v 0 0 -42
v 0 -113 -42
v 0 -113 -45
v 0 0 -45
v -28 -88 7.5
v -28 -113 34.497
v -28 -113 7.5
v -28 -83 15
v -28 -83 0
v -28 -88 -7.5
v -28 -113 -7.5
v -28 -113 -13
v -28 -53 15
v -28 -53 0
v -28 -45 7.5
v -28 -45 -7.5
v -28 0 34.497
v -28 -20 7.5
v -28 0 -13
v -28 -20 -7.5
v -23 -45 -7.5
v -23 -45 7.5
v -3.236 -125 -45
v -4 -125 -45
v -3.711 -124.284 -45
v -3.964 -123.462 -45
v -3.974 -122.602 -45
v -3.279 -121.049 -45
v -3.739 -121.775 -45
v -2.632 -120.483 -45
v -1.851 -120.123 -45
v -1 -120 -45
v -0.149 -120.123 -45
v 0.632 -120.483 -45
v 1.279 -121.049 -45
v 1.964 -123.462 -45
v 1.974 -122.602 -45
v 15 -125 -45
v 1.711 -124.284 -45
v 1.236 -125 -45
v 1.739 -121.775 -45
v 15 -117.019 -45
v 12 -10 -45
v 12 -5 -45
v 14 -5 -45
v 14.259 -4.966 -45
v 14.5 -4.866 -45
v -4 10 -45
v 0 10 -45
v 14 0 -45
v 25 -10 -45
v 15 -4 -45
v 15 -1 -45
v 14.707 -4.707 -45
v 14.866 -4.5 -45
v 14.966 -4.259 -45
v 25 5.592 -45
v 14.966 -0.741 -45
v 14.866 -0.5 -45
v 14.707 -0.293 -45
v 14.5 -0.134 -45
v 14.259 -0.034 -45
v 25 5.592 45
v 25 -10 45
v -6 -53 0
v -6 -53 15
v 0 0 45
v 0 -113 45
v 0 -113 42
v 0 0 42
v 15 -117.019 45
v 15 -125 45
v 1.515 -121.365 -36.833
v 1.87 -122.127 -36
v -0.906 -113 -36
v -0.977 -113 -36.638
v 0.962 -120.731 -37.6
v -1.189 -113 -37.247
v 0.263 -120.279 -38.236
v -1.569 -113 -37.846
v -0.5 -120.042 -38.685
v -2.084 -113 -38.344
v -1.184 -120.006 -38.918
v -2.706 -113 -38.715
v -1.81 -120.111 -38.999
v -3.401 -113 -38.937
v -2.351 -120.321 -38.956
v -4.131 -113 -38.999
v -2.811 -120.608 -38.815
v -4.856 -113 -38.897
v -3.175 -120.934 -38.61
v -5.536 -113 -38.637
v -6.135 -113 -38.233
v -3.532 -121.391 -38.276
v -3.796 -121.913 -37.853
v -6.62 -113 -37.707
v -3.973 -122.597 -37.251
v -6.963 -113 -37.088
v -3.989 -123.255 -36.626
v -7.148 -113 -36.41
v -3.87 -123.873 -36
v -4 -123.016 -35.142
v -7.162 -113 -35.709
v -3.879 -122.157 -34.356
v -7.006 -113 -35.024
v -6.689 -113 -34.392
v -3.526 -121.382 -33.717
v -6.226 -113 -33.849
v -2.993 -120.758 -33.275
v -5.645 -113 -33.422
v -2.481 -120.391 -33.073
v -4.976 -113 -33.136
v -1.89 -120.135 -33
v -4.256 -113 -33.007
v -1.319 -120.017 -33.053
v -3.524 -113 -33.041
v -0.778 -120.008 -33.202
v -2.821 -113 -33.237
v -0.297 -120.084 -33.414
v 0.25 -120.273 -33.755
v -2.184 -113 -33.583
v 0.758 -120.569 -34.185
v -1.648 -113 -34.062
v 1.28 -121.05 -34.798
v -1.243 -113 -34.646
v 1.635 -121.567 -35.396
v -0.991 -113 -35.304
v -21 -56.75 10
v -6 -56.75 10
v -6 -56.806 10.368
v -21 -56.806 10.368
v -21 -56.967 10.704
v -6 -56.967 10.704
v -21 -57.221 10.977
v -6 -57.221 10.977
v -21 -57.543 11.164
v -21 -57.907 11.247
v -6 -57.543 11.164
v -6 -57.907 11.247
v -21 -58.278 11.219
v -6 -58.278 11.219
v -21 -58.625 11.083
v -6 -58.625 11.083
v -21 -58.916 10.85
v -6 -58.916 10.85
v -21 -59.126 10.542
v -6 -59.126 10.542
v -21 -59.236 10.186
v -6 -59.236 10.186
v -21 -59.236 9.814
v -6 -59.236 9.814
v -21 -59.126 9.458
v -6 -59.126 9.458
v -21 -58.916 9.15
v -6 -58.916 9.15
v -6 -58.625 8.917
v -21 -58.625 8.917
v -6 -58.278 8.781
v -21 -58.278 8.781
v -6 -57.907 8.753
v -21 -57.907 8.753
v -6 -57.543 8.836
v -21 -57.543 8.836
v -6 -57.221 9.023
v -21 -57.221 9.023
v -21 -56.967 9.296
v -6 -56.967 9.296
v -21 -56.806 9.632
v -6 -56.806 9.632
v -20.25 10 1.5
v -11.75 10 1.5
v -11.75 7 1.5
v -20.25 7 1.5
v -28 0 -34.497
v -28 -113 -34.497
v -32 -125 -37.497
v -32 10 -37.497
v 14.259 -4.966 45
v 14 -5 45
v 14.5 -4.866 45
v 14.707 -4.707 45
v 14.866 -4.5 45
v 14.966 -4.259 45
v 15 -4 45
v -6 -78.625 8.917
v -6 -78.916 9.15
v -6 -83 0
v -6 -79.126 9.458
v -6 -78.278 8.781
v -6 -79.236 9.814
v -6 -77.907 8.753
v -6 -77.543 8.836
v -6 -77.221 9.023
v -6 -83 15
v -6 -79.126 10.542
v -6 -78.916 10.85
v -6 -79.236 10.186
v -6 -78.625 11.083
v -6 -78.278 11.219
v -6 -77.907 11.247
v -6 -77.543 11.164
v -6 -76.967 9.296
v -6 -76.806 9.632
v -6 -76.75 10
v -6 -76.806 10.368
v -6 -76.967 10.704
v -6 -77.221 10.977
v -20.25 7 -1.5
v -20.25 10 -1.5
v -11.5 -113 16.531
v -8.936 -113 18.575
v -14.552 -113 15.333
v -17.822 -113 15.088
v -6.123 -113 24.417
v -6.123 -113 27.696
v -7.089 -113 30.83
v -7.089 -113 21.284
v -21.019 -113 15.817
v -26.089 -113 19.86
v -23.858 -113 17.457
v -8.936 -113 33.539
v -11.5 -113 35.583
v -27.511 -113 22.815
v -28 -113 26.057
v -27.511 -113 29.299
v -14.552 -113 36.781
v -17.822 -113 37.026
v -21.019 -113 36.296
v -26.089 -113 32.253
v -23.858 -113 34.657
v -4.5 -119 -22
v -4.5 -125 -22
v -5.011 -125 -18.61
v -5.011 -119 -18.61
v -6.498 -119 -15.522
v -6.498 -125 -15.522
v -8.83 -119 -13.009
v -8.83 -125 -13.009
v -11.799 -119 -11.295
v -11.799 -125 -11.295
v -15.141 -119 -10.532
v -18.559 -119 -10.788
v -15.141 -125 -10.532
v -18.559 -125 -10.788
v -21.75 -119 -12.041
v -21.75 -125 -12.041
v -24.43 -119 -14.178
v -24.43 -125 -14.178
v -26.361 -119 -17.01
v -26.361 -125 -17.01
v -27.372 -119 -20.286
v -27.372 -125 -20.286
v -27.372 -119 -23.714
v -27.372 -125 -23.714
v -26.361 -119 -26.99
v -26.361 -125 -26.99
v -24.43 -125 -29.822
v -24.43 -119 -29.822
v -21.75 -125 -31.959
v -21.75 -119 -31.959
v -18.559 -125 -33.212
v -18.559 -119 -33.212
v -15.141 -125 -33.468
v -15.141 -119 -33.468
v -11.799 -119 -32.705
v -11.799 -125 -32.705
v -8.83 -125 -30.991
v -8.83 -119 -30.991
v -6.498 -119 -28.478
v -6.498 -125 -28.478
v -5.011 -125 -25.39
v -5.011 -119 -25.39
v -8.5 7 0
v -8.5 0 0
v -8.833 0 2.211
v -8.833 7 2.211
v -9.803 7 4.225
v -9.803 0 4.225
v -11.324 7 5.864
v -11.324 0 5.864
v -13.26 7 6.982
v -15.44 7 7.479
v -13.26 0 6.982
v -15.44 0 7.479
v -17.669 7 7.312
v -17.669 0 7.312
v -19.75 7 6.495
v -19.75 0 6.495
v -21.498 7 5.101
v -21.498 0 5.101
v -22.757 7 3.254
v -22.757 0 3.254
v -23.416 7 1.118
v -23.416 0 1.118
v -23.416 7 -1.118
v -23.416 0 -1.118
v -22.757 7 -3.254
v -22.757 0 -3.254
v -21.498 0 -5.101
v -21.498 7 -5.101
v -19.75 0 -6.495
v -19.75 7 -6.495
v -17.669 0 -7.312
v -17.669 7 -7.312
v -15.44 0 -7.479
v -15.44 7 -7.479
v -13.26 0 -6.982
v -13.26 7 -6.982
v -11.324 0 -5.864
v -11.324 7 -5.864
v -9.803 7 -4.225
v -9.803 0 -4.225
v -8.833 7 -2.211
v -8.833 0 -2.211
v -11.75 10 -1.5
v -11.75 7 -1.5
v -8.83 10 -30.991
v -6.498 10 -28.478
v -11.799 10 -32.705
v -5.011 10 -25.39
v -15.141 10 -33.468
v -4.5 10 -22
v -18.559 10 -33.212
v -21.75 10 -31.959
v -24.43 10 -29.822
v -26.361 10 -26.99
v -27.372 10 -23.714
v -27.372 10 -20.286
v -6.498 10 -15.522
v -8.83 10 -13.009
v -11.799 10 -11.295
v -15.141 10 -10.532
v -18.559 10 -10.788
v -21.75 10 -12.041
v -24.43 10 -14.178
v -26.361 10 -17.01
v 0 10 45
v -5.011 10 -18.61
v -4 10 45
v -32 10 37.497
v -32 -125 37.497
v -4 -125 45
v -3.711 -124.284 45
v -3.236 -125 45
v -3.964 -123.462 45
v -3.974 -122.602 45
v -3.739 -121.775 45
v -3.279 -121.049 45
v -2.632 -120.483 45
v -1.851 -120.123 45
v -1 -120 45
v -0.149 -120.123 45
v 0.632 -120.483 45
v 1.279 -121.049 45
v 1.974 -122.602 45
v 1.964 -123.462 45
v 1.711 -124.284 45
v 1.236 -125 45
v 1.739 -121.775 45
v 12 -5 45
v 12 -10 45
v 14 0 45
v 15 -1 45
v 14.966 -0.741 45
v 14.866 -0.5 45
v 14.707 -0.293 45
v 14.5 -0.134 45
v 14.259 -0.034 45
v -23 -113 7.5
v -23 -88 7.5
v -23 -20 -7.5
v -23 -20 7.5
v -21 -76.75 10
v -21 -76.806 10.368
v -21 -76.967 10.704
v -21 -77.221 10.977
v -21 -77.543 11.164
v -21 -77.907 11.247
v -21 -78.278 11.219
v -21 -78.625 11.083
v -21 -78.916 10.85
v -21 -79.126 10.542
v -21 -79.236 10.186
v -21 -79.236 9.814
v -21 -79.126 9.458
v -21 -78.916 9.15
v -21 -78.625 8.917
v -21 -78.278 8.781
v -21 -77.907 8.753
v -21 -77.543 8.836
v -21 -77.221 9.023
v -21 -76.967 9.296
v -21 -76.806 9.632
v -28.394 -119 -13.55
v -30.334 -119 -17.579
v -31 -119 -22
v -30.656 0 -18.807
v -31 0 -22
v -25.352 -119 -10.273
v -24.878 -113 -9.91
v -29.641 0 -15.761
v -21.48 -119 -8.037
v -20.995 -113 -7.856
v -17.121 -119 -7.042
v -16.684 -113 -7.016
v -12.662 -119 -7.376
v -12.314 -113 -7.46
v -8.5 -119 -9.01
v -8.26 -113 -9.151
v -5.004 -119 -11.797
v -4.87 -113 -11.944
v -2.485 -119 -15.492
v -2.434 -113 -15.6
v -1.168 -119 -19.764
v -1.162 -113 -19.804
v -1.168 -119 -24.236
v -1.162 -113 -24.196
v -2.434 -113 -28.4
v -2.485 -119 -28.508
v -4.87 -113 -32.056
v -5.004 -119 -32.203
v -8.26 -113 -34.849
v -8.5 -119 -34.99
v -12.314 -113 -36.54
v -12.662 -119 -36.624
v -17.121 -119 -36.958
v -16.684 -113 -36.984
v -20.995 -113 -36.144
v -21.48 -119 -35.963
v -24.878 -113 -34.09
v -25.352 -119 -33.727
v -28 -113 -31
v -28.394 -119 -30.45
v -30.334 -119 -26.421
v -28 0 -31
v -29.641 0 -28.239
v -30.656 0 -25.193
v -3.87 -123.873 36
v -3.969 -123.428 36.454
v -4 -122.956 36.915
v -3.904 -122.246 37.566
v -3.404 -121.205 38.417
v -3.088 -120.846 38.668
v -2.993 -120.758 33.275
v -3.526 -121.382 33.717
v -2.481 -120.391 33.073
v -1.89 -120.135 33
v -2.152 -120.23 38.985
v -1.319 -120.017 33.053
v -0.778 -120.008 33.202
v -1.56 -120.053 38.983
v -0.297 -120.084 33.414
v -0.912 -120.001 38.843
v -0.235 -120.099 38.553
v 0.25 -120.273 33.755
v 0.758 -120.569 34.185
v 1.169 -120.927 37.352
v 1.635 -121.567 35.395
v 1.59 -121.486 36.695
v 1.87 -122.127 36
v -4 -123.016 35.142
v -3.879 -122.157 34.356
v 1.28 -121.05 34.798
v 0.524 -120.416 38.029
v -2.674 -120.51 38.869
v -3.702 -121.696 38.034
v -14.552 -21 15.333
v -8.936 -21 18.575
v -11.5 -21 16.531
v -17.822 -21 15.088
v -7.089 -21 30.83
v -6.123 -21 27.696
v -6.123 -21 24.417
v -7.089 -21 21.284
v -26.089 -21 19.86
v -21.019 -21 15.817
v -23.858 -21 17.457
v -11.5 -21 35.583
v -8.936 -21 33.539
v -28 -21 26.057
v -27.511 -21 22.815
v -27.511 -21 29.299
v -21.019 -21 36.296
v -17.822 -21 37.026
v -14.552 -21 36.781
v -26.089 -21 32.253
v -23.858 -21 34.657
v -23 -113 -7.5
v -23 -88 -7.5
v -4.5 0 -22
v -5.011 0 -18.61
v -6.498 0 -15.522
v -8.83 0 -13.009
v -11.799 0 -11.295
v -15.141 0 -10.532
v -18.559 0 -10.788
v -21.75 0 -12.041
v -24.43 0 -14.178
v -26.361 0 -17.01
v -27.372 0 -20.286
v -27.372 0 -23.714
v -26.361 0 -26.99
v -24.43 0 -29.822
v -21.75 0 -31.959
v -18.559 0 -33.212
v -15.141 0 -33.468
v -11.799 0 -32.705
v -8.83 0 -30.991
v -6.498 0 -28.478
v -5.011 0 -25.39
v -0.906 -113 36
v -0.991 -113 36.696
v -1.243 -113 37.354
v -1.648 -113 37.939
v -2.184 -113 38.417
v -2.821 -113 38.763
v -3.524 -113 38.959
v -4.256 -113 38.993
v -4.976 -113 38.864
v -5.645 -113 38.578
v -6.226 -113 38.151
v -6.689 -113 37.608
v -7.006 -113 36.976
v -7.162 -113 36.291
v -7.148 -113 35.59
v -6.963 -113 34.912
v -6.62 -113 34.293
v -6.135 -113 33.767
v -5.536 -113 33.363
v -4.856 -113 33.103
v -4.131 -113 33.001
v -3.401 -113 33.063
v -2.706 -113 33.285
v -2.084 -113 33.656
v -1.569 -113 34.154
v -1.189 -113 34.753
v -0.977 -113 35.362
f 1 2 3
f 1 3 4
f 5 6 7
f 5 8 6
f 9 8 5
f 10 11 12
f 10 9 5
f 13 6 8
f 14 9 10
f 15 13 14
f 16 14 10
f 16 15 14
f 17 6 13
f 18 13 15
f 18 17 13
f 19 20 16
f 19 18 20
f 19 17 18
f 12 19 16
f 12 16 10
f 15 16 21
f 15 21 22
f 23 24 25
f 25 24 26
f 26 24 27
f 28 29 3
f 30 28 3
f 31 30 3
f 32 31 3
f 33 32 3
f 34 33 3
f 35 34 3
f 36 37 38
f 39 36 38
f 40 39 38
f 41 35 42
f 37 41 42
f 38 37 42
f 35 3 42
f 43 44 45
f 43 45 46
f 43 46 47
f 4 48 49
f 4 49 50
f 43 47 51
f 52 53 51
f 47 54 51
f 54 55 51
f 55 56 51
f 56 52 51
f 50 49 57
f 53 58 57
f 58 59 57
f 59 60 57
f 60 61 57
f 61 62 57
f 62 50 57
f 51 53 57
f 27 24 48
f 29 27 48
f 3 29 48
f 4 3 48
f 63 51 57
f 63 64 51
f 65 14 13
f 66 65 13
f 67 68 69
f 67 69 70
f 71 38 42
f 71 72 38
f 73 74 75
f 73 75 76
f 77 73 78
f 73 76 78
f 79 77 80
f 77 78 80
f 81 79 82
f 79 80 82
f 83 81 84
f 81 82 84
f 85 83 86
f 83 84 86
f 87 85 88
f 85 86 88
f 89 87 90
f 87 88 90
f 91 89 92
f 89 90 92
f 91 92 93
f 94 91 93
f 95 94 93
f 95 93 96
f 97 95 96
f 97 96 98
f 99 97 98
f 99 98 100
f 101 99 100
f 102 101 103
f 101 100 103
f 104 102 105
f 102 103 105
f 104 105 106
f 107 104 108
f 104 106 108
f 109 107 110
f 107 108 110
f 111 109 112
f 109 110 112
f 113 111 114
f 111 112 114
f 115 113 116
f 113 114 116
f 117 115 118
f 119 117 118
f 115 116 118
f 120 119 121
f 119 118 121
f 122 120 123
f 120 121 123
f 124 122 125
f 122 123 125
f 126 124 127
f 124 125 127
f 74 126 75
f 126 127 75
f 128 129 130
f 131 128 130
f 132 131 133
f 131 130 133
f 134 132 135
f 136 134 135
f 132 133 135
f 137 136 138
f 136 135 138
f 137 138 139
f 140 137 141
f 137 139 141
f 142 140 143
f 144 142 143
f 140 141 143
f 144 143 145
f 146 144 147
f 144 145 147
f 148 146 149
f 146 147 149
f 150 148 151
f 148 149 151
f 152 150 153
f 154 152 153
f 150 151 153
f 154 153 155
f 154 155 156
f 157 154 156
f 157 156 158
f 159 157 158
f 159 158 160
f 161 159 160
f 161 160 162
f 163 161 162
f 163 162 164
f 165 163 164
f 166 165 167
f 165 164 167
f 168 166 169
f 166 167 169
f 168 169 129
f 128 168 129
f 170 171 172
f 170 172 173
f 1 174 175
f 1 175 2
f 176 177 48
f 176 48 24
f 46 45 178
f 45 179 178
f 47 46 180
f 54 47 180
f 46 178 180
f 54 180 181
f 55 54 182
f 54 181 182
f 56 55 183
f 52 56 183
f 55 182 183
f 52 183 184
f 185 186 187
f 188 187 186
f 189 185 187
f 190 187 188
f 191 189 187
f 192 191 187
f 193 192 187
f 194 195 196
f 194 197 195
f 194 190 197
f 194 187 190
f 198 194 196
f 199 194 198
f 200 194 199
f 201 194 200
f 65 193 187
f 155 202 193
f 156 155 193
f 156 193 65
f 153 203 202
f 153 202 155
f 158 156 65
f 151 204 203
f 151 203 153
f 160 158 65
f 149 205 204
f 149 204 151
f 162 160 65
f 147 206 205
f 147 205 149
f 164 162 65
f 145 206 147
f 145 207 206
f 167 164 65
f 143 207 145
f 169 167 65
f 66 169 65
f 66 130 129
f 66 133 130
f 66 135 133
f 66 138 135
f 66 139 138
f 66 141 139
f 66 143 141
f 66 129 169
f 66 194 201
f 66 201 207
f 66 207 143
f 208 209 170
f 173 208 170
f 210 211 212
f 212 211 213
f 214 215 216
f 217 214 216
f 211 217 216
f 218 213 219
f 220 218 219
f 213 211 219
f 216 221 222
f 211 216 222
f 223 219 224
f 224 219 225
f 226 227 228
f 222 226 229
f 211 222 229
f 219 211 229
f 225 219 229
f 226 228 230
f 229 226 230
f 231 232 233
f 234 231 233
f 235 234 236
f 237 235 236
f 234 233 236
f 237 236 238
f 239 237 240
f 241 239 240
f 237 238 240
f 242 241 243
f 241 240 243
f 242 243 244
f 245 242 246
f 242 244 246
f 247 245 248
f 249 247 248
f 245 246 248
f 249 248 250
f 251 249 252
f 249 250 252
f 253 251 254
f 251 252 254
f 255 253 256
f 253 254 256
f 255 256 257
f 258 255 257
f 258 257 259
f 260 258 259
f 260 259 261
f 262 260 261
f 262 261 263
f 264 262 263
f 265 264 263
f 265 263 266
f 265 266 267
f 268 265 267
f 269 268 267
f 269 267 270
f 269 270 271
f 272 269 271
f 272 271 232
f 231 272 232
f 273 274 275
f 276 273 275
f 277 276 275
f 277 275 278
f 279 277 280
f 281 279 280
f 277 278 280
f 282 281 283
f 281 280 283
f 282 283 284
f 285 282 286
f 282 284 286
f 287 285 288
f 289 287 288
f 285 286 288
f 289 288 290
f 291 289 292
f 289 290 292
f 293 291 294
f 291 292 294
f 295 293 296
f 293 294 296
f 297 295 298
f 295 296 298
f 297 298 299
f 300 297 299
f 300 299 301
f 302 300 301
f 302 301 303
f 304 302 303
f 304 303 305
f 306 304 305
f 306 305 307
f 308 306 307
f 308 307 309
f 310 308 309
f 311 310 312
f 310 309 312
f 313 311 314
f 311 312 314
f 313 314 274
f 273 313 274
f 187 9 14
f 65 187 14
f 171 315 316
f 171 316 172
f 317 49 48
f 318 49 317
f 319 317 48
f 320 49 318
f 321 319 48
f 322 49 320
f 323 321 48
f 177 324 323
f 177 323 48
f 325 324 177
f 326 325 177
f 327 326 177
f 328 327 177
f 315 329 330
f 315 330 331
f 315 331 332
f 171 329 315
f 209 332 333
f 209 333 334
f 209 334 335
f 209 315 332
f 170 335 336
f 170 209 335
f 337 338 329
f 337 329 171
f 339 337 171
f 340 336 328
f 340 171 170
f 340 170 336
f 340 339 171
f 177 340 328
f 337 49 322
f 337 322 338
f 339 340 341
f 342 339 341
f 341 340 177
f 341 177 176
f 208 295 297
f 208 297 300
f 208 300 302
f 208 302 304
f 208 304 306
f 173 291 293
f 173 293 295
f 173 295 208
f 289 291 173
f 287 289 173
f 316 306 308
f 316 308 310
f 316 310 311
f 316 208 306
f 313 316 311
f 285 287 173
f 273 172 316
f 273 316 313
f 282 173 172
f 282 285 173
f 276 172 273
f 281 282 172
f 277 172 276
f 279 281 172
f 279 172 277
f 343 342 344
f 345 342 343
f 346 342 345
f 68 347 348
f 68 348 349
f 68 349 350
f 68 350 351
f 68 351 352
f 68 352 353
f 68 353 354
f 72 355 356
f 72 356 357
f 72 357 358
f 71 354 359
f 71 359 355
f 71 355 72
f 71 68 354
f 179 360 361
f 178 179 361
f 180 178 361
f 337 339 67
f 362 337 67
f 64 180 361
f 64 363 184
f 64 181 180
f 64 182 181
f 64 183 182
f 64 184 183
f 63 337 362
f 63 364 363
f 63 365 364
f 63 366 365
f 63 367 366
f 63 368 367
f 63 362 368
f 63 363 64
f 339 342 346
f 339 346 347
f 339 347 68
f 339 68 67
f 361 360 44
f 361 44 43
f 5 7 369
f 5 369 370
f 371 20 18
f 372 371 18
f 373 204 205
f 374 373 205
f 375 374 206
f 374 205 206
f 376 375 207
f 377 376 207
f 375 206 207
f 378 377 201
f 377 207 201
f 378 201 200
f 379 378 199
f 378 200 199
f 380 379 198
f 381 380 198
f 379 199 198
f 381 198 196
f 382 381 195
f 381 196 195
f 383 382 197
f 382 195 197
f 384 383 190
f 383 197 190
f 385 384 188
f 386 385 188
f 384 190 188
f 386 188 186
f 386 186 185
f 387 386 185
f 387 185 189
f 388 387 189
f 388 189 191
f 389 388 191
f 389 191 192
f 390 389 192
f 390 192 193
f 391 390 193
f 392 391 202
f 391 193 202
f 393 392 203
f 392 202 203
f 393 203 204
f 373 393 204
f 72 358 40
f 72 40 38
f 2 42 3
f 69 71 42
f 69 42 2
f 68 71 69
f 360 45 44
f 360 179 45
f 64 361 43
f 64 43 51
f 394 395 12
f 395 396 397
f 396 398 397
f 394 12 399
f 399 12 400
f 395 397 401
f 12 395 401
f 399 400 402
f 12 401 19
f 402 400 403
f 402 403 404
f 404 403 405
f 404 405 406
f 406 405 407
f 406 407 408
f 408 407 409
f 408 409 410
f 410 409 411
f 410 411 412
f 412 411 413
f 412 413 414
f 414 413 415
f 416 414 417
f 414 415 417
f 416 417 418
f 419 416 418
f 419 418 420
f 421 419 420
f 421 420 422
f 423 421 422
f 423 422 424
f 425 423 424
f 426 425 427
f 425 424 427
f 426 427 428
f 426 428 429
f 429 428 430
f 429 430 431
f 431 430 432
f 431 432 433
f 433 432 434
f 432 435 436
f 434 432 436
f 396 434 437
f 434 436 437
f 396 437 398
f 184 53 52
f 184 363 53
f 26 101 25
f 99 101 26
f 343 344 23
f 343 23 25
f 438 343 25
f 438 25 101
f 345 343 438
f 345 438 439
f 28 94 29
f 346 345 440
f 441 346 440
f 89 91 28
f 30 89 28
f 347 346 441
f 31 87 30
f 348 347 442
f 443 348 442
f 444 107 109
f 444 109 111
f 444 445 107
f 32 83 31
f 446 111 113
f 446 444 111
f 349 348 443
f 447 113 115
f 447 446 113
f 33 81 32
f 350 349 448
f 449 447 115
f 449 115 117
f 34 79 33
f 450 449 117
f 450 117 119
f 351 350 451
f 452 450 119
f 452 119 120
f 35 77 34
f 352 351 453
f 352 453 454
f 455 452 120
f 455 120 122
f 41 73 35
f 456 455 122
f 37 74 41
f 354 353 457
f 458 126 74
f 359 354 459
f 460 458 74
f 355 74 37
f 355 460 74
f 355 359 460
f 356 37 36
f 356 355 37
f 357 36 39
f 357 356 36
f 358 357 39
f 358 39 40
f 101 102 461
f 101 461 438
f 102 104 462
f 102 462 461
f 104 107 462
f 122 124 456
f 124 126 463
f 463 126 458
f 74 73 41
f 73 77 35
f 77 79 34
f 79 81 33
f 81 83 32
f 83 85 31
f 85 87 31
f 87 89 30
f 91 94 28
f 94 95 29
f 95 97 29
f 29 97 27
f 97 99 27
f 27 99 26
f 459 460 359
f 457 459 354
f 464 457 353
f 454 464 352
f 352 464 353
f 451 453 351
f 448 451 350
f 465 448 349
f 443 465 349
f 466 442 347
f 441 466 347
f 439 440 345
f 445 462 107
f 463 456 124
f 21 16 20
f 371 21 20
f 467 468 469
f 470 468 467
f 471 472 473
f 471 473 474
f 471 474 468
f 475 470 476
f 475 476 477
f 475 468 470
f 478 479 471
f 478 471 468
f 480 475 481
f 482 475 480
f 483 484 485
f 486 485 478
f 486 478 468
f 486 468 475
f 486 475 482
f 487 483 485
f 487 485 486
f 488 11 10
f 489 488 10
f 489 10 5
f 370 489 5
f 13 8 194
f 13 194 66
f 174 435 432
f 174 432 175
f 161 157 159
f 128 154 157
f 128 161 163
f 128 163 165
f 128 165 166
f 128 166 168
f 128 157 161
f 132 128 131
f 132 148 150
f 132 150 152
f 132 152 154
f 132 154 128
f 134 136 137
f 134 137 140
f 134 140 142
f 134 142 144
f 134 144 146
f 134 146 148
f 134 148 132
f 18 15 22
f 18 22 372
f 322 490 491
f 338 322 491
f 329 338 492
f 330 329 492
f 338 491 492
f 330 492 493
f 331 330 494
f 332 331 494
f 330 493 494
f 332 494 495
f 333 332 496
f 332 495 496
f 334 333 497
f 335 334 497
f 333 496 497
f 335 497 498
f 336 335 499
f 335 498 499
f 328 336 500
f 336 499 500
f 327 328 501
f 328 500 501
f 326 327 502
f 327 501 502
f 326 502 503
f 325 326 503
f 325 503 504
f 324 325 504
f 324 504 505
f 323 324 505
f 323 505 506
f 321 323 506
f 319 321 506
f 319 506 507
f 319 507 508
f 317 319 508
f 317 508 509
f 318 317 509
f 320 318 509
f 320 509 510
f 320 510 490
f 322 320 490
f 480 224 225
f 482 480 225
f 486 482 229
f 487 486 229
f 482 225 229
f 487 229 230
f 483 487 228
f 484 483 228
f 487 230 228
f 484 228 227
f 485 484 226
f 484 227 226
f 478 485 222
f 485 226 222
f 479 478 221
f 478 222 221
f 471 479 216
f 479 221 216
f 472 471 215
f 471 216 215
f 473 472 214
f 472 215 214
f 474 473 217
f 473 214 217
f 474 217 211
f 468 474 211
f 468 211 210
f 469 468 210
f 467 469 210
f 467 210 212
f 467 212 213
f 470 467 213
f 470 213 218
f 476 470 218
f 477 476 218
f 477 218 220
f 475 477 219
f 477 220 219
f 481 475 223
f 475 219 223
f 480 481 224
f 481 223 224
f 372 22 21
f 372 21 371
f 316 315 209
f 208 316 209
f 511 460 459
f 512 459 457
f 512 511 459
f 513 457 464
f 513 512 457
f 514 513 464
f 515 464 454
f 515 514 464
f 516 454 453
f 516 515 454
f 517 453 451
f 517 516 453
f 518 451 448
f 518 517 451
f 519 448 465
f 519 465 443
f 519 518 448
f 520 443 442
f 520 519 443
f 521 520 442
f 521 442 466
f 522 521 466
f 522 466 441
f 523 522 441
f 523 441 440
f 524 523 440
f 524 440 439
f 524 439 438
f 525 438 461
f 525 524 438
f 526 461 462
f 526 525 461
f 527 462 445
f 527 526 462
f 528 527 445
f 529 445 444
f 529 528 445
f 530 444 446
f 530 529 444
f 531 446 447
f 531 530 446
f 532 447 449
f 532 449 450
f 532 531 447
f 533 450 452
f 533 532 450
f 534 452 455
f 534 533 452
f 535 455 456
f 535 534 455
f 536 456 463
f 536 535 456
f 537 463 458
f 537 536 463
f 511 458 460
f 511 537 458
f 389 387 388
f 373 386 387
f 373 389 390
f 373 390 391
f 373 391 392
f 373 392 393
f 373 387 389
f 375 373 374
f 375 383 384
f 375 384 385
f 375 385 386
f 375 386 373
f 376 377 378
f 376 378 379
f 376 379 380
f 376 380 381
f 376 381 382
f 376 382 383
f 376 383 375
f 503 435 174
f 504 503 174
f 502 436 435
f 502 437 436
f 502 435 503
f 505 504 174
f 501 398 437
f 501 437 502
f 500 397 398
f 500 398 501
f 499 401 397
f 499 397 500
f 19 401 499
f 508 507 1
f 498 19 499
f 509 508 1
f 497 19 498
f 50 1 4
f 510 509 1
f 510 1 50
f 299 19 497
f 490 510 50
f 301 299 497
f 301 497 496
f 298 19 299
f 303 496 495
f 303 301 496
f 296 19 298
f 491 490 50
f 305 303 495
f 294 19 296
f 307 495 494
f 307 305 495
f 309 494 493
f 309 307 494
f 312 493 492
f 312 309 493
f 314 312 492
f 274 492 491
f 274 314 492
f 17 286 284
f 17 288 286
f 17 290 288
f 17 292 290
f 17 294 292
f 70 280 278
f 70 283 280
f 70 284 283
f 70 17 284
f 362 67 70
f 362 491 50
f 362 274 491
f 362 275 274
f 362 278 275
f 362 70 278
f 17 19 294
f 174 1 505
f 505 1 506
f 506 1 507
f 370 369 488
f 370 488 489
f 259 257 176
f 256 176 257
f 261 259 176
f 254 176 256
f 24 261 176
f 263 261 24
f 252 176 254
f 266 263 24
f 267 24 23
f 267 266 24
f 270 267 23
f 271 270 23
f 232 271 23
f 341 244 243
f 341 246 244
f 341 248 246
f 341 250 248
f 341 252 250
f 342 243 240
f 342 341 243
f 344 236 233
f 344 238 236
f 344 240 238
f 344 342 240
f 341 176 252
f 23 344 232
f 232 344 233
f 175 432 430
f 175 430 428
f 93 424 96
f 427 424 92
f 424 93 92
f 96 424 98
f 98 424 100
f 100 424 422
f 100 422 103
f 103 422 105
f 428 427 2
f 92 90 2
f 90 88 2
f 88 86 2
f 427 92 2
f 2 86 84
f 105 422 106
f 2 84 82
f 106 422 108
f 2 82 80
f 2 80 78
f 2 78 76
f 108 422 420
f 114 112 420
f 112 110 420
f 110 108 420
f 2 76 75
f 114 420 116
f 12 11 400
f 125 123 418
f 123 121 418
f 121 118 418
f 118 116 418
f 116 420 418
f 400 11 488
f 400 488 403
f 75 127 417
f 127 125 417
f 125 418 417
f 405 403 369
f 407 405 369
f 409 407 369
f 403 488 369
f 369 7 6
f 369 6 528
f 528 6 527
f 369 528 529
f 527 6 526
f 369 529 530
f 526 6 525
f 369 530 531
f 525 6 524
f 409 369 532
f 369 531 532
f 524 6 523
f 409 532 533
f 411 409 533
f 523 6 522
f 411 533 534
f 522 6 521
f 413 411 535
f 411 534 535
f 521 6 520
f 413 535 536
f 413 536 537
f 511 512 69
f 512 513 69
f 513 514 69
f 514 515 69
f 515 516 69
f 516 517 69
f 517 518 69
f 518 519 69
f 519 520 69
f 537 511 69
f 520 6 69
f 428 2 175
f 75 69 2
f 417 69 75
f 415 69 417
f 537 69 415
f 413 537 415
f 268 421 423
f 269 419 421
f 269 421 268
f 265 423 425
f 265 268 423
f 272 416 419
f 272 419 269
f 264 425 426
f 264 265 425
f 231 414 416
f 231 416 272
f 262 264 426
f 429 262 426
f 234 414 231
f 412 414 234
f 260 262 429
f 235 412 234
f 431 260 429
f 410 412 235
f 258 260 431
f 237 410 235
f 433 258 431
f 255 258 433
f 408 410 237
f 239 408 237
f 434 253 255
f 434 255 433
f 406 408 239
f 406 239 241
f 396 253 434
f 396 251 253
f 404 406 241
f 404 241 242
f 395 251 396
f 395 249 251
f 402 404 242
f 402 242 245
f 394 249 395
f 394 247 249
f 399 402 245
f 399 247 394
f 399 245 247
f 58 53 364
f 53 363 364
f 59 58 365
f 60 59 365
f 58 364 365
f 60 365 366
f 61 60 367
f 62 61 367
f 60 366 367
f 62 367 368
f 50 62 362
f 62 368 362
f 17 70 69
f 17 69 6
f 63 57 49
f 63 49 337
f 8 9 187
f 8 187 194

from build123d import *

# Parameters (mm, degrees)
F1_DEPTH  = 45
F2_SIZE2  = 7.502567
F2_SIZE   = 27.99999
F3_SIZE2  = 7.502567
F3_SIZE   = 27.99999
F5_DEPTH  = 113
F6_R      = 11.5
F7_DEPTH  = 135.001
F8_R      = 15
F9_DEPTH  = 6
F10_DEPTH = 113
F11_W     = 30
F11_H     = 15
F12_DEPTH = 22
F13_R     = 1.25
F14_DEPTH = 15
F15_W     = 8.5
F15_H     = 3
F16_DEPTH = 10
F17_R     = 7.5
F18_DEPTH = 7
F19_W     = 25
F19_H     = 15
F20_DEPTH = 5
F21_SIZE2 = 4.4081745177
F21_SIZE  = 25
F25_R     = 11
F26_DEPTH = 92
F27_R     = 1


# Not quite as in the source:
# - a fillet or chamfer is up to 0.001 mm smaller than in the source, because OpenCascade refuses the exact size
# - a pattern or mirror of a feature is missing from the dataset's text; its kind, count and spacing are read off the source's solid


with BuildPart() as f1:
    # F0 (on Top) → F1 (new body, symmetric)
    with BuildSketch(Plane.XY):
        with BuildLine():
            Line((0, -113), (0, 0))
            Line((0, 0), (15, 0))
            Line((15, 0), (15, -5))
            Line((15, -5), (12, -5))
            Line((12, -5), (12, -10))
            Line((12, -10), (25, -10))
            Line((25, -10), (25, 10))
            Line((25, 10), (-32, 10))
            Line((-32, 10), (-32, -125))
            Line((-32, -125), (-3.2360679775, -125))
            ThreePointArc((-3.2360679775, -125), (-1, -120), (1.2360679775, -125))
            Line((1.2360679775, -125), (15, -125))
            Line((15, -125), (15, -117.0192378865))
            Line((15, -117.0192378865), (0, -113))
        make_face()
    extrude(amount=F1_DEPTH, both=True)

    # F2 (size 28 and 7.5025773881 in the source; OpenCascade refuses exactly that, so slightly less here)
    f2_edges = [f1.edges().sort_by_distance(p)[0] for p in [
        (-32, -57.5, 45),
    ]]
    f2_side = f1.faces().sort_by_distance((-13.040115, -54.60791, 45))[0]
    chamfer(f2_edges, length=F2_SIZE, length2=F2_SIZE2, reference=f2_side)

    # F3 (size 28 and 7.5025773881 in the source; OpenCascade refuses exactly that, so slightly less here)
    f3_edges = [f1.edges().sort_by_distance(p)[0] for p in [
        (-32, -57.5, -45),
    ]]
    f3_side = f1.faces().sort_by_distance((-13.040115, -54.60791, -45))[0]
    chamfer(f3_edges, length=F3_SIZE, length2=F3_SIZE2, reference=f3_side)

    # F4 (on face) → F5 (cut)
    with BuildSketch(Plane.XZ):
        Polygon((0, -42), (0, 0), (0, 42), (-28, 34.4974226119), (-28, 0), (-28, -34.4974226119), align=None)
    extrude(amount=F5_DEPTH, mode=Mode.SUBTRACT)

    # F6 (on face) → F7 (cut, through all)
    with BuildSketch(Plane.XZ.offset(125)):
        with Locations((-16, -22)):
            Circle(F6_R)
    extrude(amount=-F7_DEPTH, mode=Mode.SUBTRACT)

    # F8 (on face) → F9 (cut)
    with BuildSketch(Plane(origin=(0, -113, 0), x_dir=(-1, 0, 0), z_dir=(0, 1, 0))):
        with Locations((16, -22)):
            Circle(F8_R)
    extrude(amount=-F9_DEPTH, mode=Mode.SUBTRACT)

    # F8 (on face) → F10 (cut, through all)
    with BuildSketch(Plane(origin=(0, -113, 0), x_dir=(-1, 0, 0), z_dir=(0, 1, 0))):
        with Locations((16, -22)):
            Circle(F8_R)
    extrude(amount=F10_DEPTH, mode=Mode.SUBTRACT)

    # F11 (on face) → F12 (join)
    with BuildSketch(Plane.YZ.offset(-28)):
        with Locations((-68, 7.5)):
            Rectangle(F11_W, F11_H)
    extrude(amount=F12_DEPTH)

    # F13 (on face) → F14 (cut)
    with BuildSketch(Plane.YZ.offset(-6)):
        with Locations((-78, 10)):
            Circle(F13_R)
        with Locations((-58, 10)):
            Circle(F13_R)
    extrude(amount=-F14_DEPTH, mode=Mode.SUBTRACT)

    # F15 (on face) → F16 (cut, through all)
    with BuildSketch(Plane(origin=(0, 10, 0), x_dir=(-1, 0, 0), z_dir=(0, 1, 0))):
        with Locations((16, 0)):
            Rectangle(F15_W, F15_H)
    extrude(amount=-F16_DEPTH, mode=Mode.SUBTRACT)

    # F17 (on face) → F18 (cut)
    with BuildSketch(Plane.XZ):
        with Locations((-16, 0)):
            Circle(F17_R)
    extrude(amount=-F18_DEPTH, mode=Mode.SUBTRACT)

    # F19 (on face) → F20 (join)
    with BuildSketch(Plane.YZ.offset(-28)):
        with Locations((-100.5, 0)):
            Rectangle(F19_W, F19_H)
        with Locations((-32.5, 0)):
            Rectangle(F19_W, F19_H)
    extrude(amount=F20_DEPTH)

    # F21
    f21_edges = [f1.edges().sort_by_distance(p)[0] for p in [
        (25, 10, 0),
    ]]
    f21_side = f1.faces().sort_by_distance((-1.370356, 10, 2.040759))[0]
    chamfer(f21_edges, length=F21_SIZE, length2=F21_SIZE2, reference=f21_side)

    # F23 (on offset) → F24 (revolve, cut)
    with BuildSketch(Plane.XY.offset(36)):
        Polygon((-4.9269355532, -99.7771988864), (-7.7971363015, -100.6500950226), (-1, -123), (1.8702007483, -122.1271038638), align=None)
    f24 = revolve(axis=Axis((-4.3985681508, -111.8250475113, 36), (0.2909653787, -0.9567335828, 0)), mode=Mode.SUBTRACT)

    # F24_copies: F24 across plane
    add(f24.mirror(Plane(origin=(0, 0, -1.1e-05), x_dir=(-1, 0, 0), z_dir=(0, 0, -1))), mode=Mode.SUBTRACT)

    # F27
    f27_edges = [f1.edges().sort_by_distance(p)[0] for p in [
        (15, 0, 0),
        (15, -5, 0),
    ]]
    fillet(f27_edges, radius=F27_R)


with BuildPart() as f26:
    # F25 (on face) → F26 (new body)
    with BuildSketch(Plane(origin=(0, -113, 0), x_dir=(-1, 0, 0), z_dir=(0, 1, 0))):
        with Locations((17, 26.0568257442)):
            Circle(F25_R)
    extrude(amount=F26_DEPTH)


solid = Compound([f1.part, f26.part])
